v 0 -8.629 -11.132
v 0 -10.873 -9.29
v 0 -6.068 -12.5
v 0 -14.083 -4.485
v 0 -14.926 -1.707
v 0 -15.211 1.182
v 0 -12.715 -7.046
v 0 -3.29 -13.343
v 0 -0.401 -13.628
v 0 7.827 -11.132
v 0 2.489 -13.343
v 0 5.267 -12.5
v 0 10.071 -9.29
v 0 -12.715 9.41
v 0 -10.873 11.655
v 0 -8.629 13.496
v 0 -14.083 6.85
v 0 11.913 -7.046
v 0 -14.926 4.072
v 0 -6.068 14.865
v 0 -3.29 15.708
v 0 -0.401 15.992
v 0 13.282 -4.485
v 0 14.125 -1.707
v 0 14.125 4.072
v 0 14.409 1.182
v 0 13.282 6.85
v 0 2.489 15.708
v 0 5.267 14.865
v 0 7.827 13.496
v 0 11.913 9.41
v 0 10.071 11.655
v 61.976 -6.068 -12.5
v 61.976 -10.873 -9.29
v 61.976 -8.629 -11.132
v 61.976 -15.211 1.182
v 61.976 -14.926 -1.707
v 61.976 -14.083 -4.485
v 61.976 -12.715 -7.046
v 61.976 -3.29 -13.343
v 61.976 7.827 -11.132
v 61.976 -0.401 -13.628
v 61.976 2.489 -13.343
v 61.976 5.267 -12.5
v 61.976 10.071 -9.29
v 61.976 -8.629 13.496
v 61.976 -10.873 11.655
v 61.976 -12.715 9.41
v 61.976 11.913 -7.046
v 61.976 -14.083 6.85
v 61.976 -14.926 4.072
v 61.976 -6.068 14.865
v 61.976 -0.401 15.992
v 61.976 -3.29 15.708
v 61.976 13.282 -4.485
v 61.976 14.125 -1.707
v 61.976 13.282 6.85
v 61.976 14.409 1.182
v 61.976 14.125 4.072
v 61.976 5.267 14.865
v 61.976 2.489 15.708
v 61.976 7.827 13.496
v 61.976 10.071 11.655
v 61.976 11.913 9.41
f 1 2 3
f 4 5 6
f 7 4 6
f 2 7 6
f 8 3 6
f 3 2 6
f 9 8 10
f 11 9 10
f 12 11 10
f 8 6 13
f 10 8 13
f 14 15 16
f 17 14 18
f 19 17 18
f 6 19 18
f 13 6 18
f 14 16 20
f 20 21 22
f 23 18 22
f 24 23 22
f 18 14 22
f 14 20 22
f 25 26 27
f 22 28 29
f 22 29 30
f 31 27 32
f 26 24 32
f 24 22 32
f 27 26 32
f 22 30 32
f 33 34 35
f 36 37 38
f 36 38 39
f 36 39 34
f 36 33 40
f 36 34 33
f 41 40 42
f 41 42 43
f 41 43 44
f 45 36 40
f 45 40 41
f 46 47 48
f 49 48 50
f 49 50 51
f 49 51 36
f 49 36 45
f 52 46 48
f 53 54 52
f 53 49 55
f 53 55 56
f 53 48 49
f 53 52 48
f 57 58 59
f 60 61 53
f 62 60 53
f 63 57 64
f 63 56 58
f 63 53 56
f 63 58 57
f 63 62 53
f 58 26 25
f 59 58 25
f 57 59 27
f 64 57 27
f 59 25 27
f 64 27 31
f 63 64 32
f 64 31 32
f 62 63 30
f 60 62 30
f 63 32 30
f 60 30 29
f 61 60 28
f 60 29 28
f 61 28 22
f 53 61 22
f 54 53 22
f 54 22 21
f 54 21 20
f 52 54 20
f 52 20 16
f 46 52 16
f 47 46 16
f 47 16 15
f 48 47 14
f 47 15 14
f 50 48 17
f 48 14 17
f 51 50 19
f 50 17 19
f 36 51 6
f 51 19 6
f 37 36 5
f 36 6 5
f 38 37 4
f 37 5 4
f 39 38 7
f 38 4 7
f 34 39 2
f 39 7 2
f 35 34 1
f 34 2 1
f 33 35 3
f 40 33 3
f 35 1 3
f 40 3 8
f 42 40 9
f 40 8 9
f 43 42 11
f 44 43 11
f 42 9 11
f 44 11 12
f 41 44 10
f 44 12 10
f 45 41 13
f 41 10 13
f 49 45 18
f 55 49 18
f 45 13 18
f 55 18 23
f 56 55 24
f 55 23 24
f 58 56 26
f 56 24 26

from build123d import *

# Parameters (mm, degrees)
F0_R     = 13.3987059817
F1_DEPTH = 64.516
F3_R     = 14.8099324152
F4_DEPTH = 61.976


with BuildPart() as f1:
    # F0 (on Top) → F1 (new body)
    with BuildSketch(Plane.XY):
        Circle(F0_R)
    extrude(amount=F1_DEPTH)


with BuildPart() as f4:
    # F3 (on Right) → F4 (new body)
    with BuildSketch(Plane.YZ):
        with Locations((-0.4007364958, 1.1823429543)):
            Circle(F3_R)
    extrude(amount=F4_DEPTH)


solid = f4.part
